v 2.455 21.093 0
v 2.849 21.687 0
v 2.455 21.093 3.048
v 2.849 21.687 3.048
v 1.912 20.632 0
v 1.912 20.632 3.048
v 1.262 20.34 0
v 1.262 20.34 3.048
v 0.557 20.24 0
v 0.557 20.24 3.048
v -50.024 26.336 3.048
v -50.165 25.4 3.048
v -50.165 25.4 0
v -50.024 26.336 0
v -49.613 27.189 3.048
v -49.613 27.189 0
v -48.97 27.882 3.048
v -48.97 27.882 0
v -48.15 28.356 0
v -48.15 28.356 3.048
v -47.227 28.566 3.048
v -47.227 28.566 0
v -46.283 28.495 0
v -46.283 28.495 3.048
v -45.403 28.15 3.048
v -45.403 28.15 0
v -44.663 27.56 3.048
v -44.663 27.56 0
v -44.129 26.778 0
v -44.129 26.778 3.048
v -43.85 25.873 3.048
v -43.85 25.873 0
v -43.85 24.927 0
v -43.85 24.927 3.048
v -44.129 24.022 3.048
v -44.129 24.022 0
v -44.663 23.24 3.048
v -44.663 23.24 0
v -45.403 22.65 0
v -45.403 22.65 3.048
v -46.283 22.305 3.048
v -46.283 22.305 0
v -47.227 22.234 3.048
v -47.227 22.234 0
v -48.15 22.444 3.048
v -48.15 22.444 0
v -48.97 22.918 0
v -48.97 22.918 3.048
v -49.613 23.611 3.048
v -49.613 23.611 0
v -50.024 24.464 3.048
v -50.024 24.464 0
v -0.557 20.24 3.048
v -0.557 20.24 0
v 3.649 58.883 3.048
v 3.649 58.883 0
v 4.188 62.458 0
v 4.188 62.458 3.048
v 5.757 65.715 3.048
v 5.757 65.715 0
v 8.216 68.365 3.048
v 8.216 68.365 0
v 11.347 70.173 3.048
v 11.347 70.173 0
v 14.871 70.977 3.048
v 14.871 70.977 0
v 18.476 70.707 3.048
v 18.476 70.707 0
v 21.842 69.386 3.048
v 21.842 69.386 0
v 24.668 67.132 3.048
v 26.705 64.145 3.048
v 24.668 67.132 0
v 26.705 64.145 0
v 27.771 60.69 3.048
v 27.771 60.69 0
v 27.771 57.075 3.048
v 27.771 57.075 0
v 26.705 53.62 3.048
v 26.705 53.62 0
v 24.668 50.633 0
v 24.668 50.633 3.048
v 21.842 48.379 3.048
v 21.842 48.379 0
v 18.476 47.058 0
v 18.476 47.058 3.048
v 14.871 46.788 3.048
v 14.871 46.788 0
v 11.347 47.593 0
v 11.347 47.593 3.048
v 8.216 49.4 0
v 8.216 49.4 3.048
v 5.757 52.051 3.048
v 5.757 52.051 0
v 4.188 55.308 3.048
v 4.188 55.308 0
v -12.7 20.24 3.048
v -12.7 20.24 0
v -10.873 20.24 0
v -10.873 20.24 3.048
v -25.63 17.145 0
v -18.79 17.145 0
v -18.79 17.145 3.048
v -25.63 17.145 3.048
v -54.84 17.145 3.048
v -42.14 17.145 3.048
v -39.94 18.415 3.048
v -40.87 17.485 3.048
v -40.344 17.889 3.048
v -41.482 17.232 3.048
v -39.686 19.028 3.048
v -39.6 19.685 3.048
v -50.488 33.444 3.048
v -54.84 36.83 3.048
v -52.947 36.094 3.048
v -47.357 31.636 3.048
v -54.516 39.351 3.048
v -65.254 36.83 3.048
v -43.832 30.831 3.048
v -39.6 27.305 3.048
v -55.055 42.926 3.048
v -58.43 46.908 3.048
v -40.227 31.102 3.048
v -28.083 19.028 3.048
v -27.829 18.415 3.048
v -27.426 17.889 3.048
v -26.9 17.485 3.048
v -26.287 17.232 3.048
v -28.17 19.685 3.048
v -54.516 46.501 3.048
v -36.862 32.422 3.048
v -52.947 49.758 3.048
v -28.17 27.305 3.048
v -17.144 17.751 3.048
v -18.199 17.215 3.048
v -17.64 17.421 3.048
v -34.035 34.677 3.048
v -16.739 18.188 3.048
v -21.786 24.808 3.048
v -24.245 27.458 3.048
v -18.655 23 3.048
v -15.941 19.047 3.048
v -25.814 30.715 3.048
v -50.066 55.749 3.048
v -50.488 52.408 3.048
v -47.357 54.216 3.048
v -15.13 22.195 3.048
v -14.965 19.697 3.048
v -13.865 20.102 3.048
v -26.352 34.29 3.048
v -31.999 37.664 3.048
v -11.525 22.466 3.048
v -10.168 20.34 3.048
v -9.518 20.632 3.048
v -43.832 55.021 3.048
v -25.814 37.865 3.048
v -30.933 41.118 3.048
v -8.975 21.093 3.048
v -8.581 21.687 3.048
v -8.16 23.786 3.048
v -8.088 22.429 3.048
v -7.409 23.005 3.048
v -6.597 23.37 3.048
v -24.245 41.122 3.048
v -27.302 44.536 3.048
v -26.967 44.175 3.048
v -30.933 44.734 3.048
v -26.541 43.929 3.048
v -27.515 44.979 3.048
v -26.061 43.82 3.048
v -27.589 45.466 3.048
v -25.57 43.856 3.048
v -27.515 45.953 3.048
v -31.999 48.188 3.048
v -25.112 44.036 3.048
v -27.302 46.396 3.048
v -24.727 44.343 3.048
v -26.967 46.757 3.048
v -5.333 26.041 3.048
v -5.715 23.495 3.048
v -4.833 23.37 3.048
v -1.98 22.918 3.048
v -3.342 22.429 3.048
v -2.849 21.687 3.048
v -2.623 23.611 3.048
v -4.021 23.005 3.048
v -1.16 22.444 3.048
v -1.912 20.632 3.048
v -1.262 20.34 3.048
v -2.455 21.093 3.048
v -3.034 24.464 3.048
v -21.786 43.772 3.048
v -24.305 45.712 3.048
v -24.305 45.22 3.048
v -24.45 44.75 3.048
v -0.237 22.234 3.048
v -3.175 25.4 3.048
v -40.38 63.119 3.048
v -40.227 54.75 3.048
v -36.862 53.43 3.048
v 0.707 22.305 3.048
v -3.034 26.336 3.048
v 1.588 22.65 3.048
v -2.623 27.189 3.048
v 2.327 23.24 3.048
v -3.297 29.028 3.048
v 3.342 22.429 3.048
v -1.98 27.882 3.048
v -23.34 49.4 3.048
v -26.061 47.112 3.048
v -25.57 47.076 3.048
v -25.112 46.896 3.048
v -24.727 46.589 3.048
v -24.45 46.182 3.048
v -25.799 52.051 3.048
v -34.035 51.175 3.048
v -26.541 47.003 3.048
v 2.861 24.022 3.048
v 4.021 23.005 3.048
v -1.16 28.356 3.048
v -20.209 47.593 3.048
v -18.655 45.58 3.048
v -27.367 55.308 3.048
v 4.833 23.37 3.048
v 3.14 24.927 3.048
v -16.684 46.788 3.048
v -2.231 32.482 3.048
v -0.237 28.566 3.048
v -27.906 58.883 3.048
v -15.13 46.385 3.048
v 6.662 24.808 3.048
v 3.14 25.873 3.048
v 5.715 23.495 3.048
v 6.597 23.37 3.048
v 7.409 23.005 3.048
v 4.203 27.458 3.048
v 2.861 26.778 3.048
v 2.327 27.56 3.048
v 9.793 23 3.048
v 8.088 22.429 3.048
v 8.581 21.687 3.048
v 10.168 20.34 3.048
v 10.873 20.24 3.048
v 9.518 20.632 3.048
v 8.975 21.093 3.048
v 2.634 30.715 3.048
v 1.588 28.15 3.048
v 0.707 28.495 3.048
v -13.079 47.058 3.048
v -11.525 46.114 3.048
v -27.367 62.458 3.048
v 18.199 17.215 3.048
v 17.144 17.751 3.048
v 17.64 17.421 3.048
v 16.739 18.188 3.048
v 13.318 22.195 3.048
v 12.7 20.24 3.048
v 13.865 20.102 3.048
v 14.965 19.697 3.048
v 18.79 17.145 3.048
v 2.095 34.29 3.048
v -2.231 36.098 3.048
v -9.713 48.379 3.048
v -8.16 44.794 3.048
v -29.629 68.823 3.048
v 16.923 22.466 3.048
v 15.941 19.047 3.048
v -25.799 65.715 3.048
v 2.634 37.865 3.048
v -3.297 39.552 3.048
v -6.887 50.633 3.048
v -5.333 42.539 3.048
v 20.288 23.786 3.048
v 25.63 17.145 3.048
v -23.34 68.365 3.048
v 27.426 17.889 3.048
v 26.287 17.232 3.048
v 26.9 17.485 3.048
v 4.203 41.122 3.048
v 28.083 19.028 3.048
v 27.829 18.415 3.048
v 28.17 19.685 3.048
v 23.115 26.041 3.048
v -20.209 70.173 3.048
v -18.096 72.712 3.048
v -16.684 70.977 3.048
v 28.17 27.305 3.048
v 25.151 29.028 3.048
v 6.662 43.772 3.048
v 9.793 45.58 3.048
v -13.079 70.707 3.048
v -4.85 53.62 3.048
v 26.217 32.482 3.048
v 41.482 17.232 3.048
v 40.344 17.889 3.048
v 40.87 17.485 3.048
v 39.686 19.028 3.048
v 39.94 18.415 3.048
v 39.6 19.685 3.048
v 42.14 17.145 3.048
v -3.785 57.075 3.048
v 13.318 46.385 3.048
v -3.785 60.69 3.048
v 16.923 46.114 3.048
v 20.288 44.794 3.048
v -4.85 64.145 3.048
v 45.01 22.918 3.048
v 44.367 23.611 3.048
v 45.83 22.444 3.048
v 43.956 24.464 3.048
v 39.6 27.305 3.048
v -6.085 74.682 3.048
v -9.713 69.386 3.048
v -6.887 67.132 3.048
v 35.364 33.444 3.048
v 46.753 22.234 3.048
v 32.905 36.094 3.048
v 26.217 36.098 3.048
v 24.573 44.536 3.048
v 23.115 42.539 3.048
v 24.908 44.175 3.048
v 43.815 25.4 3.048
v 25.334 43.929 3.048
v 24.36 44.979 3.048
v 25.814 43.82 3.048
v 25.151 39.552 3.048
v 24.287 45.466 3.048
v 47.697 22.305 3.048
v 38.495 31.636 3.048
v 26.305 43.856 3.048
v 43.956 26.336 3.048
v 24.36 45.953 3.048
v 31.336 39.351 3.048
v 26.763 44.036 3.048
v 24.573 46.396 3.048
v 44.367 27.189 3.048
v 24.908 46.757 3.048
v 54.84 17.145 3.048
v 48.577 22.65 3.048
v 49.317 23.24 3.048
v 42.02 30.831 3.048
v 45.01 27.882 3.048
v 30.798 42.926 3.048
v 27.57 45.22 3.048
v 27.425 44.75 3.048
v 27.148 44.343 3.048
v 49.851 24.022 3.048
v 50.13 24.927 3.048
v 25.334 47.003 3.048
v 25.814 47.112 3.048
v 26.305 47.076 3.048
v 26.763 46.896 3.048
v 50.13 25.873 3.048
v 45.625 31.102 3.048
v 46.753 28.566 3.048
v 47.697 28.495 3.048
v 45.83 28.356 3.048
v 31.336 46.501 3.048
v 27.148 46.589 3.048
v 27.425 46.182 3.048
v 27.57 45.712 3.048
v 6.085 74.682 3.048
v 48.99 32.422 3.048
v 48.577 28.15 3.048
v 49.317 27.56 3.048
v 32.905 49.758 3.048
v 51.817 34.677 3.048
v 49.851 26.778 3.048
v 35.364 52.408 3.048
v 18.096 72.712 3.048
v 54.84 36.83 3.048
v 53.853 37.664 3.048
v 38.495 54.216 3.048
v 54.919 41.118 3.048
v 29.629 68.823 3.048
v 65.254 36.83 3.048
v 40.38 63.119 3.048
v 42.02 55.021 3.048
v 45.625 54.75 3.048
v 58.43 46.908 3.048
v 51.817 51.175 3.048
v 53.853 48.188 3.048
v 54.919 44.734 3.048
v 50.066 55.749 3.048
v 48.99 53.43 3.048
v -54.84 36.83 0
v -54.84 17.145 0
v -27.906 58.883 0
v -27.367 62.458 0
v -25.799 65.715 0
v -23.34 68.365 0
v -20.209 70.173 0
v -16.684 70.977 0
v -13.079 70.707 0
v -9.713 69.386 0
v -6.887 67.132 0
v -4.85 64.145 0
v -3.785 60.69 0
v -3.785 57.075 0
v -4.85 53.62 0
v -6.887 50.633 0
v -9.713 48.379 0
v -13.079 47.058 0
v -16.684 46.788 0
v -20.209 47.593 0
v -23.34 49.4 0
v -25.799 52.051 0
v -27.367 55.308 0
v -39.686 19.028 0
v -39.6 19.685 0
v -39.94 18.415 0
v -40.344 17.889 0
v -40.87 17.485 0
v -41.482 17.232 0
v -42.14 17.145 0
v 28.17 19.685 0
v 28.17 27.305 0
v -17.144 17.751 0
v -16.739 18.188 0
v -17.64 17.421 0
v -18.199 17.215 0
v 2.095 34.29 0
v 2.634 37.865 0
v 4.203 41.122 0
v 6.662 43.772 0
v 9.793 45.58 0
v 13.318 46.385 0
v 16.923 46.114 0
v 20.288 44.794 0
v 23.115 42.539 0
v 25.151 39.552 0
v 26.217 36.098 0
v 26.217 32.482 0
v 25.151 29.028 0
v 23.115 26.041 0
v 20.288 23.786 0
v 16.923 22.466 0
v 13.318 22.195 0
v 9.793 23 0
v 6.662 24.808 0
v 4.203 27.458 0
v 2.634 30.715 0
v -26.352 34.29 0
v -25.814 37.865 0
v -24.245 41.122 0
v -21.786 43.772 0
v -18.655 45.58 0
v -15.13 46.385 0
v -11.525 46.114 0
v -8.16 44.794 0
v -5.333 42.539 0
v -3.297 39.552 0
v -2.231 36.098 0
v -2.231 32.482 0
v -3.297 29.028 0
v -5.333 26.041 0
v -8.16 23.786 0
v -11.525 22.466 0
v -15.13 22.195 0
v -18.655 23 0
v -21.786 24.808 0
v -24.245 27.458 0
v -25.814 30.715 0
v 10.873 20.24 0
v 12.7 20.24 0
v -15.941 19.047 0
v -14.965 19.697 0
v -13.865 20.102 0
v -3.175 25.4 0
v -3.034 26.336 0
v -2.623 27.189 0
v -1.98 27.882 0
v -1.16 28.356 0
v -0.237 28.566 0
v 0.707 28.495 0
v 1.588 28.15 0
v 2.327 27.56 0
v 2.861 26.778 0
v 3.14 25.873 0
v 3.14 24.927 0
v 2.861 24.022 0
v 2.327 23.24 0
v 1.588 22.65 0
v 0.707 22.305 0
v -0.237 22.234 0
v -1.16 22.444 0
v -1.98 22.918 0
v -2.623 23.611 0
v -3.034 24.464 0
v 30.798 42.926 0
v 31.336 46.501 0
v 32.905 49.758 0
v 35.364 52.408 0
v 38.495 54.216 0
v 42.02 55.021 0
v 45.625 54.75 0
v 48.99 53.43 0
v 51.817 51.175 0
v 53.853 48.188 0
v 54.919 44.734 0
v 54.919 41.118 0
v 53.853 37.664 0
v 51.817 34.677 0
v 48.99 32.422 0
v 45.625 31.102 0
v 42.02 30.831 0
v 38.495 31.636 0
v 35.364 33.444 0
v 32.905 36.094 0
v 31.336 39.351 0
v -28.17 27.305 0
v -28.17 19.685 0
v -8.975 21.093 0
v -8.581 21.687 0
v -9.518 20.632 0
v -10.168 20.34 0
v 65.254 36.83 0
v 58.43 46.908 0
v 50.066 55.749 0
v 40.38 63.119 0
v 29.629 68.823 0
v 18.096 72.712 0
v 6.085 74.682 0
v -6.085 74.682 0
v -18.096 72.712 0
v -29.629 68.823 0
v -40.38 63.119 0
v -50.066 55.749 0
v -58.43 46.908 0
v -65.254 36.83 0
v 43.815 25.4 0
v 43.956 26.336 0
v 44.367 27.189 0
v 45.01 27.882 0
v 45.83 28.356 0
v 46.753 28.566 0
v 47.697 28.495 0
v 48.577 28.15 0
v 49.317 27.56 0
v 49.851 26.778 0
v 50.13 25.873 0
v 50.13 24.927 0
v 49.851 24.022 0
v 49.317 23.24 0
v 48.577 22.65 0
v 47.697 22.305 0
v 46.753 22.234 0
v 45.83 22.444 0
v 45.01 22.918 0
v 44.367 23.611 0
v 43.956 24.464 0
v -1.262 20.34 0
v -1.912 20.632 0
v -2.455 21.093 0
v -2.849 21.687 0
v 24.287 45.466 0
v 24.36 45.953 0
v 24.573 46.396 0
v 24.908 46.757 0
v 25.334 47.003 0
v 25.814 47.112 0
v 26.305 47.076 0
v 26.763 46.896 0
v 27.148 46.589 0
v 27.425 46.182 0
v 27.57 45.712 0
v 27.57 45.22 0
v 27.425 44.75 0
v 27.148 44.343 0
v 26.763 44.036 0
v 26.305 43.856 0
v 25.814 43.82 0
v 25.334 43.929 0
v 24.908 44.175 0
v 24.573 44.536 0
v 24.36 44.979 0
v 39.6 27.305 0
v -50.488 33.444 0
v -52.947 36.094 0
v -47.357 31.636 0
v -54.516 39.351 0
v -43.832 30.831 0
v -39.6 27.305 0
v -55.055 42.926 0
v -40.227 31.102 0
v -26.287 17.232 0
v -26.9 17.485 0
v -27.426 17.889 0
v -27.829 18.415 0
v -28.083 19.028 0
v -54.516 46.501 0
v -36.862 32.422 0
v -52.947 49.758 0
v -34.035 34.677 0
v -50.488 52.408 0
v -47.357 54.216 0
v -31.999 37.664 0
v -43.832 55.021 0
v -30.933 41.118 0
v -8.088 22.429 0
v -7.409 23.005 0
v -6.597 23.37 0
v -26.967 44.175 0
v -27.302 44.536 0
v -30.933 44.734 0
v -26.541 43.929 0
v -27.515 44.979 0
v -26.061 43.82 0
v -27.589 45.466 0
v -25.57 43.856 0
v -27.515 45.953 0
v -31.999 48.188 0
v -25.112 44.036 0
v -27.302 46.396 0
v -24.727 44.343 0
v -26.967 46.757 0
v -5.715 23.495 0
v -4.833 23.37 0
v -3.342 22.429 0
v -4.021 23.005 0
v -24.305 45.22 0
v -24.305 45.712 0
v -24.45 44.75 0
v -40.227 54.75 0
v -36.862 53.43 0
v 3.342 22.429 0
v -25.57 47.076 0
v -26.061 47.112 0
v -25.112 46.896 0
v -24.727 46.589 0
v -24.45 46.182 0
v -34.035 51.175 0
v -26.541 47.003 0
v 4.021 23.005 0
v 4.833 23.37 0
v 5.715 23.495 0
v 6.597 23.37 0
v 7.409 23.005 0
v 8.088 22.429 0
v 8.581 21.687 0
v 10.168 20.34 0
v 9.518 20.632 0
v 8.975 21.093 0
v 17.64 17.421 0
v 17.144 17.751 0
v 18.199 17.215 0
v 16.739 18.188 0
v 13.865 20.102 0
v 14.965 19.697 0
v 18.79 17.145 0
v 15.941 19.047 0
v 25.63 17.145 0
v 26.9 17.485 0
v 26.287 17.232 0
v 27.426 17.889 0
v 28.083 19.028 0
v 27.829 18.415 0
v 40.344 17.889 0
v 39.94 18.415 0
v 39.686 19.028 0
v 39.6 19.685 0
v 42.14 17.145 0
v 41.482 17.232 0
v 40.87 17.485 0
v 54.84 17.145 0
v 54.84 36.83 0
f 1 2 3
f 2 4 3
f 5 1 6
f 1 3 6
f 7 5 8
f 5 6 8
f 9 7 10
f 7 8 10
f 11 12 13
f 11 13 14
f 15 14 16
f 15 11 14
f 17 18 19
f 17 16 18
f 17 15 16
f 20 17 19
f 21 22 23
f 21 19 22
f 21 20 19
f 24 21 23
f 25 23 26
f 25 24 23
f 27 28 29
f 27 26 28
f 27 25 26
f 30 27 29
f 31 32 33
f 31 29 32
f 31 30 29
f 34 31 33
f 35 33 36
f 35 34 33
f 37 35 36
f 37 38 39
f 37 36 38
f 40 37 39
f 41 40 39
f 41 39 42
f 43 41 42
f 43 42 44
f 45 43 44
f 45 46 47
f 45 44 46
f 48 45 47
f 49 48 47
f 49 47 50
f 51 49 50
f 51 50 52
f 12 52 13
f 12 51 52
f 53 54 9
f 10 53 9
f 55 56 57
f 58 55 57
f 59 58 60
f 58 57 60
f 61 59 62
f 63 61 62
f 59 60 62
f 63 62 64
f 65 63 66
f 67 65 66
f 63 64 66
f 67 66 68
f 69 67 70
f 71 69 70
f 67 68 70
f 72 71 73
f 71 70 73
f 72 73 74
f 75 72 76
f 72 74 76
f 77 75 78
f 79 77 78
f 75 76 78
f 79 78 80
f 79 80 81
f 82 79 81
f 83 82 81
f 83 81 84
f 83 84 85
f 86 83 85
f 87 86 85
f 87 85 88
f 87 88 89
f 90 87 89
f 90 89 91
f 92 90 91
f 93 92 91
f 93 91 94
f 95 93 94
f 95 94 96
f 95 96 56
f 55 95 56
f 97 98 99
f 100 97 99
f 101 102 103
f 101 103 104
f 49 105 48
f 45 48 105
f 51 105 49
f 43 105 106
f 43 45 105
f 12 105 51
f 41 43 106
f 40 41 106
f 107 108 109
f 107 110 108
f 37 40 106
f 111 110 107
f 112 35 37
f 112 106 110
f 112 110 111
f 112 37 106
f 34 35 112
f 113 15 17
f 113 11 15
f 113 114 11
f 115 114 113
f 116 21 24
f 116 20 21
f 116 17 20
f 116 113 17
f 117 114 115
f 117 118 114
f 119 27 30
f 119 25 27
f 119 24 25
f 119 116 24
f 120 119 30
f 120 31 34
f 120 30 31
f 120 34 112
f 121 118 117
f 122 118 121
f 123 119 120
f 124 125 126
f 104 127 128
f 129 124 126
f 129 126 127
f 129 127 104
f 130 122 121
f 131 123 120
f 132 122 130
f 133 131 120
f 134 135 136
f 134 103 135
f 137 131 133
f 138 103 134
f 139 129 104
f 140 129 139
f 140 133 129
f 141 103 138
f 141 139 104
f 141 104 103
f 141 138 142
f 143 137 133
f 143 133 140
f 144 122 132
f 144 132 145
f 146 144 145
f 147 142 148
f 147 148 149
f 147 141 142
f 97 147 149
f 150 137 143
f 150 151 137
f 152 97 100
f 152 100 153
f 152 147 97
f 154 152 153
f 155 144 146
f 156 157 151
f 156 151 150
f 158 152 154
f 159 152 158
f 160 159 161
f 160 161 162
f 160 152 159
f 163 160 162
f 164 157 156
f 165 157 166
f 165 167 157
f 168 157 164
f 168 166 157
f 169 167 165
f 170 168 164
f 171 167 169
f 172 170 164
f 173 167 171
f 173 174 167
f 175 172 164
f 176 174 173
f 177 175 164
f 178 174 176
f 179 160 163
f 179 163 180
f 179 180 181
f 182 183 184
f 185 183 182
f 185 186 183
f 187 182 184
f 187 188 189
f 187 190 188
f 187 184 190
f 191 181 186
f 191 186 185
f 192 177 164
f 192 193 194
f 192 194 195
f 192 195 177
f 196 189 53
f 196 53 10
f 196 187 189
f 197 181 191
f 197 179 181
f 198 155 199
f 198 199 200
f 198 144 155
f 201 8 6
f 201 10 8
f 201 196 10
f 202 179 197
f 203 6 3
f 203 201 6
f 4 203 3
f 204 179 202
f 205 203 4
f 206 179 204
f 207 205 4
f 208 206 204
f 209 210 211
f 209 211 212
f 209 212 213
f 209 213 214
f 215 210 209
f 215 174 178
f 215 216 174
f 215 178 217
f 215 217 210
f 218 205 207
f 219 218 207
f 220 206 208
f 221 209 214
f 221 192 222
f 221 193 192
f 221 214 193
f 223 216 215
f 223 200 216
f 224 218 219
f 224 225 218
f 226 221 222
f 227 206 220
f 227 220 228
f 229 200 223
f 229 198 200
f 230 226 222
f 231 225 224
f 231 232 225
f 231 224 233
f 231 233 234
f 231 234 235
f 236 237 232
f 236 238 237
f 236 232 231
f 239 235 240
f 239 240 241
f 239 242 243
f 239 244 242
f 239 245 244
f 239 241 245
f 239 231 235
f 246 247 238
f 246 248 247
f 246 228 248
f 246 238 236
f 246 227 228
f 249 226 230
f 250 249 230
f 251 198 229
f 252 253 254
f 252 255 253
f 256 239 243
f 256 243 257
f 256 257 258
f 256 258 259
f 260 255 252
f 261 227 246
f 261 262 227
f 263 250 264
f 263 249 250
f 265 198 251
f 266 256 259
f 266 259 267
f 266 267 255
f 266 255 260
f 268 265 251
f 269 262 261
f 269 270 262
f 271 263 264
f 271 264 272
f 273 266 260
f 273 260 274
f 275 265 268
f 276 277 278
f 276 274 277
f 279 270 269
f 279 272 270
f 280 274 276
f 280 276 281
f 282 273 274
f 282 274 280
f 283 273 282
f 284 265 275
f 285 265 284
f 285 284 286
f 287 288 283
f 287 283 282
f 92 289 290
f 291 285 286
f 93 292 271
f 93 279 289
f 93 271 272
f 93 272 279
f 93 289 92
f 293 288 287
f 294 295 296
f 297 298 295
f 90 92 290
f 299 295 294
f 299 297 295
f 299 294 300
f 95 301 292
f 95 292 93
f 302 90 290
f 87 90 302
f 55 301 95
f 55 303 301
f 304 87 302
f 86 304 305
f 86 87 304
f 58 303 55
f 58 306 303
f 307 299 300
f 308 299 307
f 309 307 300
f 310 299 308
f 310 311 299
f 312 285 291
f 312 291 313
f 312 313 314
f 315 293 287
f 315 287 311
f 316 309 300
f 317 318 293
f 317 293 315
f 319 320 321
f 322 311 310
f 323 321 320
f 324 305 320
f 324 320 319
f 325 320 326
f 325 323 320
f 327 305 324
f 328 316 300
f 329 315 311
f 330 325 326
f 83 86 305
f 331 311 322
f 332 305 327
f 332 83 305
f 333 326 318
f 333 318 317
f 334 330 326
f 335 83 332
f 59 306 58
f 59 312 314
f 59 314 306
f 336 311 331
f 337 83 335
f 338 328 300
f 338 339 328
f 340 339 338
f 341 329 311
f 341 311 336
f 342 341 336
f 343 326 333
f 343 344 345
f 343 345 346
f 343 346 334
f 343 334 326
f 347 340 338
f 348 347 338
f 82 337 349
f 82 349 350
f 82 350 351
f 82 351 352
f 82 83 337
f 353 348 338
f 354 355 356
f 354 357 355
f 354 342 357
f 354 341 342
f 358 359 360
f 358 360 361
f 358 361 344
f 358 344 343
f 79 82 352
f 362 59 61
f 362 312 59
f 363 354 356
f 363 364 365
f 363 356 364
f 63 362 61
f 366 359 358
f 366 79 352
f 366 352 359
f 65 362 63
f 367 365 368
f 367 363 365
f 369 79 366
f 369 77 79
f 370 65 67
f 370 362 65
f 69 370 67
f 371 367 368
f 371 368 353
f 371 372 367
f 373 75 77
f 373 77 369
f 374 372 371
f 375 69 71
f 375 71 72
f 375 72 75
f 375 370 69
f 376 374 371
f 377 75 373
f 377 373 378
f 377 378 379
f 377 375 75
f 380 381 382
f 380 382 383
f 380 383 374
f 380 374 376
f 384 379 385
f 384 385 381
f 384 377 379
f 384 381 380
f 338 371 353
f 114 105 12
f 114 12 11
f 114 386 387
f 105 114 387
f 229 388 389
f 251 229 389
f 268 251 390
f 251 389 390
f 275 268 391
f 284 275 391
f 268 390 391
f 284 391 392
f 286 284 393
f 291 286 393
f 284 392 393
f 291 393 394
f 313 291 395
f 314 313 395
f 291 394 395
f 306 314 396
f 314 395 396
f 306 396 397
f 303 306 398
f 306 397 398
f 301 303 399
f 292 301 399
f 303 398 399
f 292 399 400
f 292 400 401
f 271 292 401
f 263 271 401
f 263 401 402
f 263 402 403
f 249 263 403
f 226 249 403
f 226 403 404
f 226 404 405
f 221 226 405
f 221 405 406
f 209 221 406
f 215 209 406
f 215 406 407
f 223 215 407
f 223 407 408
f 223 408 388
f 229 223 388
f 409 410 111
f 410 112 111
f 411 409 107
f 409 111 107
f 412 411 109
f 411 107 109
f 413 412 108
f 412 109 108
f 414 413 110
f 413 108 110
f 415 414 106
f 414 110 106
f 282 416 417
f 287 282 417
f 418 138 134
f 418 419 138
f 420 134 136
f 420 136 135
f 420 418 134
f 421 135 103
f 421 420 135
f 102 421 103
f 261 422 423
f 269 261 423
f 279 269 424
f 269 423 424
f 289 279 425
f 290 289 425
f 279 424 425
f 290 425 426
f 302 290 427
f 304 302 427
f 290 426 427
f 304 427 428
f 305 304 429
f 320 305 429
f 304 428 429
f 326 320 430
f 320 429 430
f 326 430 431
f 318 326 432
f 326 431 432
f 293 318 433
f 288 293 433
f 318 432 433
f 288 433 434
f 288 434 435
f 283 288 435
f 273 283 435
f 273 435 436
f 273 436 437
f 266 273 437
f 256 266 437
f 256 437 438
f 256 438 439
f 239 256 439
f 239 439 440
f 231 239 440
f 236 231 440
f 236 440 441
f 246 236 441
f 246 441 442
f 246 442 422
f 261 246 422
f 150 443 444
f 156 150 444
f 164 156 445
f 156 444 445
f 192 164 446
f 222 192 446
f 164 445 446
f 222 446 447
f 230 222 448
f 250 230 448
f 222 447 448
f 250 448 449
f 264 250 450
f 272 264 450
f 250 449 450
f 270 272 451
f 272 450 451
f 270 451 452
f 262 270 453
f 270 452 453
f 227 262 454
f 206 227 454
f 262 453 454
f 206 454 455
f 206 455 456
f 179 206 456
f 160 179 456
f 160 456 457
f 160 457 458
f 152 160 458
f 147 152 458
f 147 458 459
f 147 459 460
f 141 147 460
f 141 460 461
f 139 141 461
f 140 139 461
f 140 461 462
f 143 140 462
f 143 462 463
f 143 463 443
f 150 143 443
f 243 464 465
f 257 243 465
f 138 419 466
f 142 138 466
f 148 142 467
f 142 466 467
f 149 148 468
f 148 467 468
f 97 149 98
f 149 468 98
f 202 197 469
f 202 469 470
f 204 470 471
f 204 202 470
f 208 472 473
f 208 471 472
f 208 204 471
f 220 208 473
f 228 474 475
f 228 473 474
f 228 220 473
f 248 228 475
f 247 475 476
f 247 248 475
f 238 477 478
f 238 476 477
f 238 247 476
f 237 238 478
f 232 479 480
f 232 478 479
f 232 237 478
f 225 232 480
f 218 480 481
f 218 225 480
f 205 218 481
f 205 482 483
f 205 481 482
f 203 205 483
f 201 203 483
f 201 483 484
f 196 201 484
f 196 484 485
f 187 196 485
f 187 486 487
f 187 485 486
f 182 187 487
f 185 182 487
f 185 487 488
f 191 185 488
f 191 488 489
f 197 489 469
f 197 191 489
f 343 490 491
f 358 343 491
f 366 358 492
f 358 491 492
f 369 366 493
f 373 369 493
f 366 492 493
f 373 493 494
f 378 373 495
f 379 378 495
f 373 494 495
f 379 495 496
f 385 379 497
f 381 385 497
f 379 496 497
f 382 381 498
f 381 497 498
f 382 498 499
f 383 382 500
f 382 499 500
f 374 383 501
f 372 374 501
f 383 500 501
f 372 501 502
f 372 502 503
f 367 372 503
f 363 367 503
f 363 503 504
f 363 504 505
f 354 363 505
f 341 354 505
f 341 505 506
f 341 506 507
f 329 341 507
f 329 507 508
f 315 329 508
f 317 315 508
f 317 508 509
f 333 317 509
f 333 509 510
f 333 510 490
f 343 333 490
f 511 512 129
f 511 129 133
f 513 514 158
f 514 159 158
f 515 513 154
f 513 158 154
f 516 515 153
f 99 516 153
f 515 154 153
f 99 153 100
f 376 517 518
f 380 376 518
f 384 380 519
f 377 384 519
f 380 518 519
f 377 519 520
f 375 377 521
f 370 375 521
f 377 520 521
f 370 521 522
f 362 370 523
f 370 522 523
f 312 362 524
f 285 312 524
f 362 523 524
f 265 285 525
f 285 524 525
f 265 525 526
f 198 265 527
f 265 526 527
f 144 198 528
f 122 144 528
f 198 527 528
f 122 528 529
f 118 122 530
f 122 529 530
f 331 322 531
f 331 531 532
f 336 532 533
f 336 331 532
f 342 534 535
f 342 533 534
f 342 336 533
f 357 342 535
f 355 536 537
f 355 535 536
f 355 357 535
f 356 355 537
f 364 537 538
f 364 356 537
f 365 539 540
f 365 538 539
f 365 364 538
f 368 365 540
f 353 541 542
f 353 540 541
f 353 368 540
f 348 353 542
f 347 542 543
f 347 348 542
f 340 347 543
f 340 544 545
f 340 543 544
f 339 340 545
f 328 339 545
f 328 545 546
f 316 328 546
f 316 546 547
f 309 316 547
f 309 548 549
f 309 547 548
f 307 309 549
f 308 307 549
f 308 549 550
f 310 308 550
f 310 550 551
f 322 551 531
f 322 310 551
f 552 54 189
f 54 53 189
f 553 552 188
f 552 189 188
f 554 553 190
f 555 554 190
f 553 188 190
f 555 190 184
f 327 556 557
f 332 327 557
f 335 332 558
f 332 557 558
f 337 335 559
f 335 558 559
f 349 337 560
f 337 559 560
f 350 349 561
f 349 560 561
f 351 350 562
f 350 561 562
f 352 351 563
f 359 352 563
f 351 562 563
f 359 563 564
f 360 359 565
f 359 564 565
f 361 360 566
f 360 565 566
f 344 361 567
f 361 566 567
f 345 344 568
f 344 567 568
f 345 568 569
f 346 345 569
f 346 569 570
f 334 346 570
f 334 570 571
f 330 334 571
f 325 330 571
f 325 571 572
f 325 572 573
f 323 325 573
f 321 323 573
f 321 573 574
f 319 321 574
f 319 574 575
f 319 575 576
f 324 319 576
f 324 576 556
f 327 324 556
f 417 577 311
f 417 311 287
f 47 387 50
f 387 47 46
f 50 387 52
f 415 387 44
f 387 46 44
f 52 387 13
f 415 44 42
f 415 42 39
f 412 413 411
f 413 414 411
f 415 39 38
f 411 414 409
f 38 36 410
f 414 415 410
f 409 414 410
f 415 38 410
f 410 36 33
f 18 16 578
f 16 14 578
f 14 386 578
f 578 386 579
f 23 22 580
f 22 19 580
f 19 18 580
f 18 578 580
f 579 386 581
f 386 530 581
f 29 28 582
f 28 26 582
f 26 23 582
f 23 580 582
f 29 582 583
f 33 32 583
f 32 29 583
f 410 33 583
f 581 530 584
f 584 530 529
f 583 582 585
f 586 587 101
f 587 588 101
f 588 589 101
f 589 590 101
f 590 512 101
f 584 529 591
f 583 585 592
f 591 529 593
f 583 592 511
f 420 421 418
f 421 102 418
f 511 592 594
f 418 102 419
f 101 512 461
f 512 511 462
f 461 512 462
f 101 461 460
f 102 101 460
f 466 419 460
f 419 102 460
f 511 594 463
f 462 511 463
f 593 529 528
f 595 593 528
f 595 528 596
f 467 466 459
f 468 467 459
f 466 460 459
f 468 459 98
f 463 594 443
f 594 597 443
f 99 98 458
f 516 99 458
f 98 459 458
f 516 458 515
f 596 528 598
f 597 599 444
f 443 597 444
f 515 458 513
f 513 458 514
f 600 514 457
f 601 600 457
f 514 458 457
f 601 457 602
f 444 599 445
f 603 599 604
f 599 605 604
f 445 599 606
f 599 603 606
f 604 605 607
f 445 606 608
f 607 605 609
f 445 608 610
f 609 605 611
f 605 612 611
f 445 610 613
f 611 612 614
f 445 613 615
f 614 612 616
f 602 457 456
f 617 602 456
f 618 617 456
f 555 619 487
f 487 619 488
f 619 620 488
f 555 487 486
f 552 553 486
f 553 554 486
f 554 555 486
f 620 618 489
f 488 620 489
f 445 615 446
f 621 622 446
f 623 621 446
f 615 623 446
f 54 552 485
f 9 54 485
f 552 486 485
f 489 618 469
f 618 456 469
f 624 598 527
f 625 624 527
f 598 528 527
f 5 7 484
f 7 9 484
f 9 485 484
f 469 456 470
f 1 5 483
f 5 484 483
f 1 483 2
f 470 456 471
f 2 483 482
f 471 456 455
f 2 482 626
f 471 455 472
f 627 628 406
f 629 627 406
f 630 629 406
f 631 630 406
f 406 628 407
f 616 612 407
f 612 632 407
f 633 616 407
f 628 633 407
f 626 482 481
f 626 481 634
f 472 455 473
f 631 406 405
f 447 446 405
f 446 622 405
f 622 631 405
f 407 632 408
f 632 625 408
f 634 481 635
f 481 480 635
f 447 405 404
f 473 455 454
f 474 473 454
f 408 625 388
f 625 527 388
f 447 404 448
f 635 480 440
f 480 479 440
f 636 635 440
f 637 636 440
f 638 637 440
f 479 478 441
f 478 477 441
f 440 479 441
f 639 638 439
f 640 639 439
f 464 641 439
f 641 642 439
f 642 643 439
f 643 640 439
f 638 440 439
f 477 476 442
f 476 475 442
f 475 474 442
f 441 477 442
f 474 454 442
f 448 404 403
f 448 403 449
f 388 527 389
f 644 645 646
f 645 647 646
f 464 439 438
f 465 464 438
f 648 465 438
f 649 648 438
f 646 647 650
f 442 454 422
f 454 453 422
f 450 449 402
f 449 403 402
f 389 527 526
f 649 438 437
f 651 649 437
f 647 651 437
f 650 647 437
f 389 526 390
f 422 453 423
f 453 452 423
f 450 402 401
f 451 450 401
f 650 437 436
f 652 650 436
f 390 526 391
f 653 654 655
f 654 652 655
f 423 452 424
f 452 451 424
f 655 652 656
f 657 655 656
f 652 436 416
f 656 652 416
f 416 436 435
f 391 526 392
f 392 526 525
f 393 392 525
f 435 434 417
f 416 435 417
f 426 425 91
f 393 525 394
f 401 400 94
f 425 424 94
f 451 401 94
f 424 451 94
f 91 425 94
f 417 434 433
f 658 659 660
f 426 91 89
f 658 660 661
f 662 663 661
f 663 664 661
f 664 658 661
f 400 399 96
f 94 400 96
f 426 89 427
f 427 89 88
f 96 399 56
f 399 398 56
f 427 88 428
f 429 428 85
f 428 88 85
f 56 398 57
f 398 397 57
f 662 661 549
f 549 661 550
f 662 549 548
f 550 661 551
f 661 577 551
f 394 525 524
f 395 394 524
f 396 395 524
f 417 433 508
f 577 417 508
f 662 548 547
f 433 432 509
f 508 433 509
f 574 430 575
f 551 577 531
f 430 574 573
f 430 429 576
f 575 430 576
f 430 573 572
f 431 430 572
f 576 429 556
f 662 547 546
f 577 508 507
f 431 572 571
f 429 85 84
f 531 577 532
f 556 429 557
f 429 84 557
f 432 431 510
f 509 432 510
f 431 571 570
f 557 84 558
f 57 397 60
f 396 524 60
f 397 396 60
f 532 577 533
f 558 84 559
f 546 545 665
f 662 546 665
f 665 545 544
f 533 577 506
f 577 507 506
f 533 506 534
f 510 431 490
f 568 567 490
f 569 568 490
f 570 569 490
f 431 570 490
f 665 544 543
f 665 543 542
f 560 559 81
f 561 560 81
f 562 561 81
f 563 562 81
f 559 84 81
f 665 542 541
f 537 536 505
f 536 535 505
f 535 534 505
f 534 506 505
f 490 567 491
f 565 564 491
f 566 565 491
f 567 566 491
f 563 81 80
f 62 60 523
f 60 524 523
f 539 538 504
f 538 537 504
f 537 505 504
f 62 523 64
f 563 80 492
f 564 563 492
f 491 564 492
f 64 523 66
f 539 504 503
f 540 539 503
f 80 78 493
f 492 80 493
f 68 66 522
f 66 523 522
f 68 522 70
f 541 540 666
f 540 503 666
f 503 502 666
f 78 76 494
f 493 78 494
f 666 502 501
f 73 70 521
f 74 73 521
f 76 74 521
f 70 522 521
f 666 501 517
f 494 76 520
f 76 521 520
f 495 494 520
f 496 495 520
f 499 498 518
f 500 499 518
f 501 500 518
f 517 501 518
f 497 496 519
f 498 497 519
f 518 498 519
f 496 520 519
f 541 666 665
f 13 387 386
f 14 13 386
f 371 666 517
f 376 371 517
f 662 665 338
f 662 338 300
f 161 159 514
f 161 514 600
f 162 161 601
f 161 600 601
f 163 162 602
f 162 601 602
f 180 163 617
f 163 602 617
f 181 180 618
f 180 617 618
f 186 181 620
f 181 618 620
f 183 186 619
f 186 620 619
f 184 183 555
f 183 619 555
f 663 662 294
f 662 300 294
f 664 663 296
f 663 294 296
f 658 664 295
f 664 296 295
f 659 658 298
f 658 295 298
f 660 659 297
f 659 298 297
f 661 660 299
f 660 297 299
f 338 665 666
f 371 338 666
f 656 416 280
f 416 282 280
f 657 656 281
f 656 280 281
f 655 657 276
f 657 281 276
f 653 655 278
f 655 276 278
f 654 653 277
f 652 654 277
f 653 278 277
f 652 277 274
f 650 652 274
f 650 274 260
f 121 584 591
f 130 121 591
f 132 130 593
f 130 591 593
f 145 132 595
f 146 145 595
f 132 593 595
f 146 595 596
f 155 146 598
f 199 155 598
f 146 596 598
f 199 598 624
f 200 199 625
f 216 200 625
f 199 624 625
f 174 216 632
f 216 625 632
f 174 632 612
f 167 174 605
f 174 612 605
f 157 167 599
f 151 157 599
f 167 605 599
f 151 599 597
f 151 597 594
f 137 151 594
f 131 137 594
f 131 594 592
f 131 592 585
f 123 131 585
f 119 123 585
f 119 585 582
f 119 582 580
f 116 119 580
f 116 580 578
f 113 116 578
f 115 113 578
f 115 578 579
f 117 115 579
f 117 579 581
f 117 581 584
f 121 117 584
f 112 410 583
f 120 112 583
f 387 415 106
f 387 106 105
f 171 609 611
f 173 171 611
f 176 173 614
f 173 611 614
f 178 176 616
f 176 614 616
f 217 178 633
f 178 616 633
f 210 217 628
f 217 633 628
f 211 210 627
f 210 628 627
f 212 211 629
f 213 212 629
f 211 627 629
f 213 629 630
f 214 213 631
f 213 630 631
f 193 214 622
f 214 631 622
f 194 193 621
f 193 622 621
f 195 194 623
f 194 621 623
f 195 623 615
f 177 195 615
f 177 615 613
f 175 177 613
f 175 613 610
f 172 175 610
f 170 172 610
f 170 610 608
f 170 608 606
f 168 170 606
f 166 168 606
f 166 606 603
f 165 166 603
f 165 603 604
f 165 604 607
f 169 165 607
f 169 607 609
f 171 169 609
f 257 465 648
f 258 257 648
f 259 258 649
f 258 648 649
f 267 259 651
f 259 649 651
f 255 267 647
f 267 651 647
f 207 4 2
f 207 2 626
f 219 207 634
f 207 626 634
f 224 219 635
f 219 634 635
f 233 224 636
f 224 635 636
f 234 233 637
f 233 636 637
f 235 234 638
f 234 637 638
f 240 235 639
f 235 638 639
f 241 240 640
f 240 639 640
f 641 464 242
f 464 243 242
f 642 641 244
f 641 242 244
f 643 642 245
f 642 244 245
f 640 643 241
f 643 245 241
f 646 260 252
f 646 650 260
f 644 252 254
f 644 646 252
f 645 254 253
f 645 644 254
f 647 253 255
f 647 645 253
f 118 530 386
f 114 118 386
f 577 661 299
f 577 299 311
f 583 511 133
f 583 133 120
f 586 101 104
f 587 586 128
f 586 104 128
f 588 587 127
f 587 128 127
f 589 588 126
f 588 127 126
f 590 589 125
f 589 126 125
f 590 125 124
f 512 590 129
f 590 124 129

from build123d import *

# Parameters (mm, degrees)
SKETCH1_R                 = 1.651
BOSS_EXTRUDE2_DEPTH       = 3.048
SKETCH2_R                 = 1.143
CUT_EXTRUDE1_DEPTH        = 4.048
SKETCH3_R                 = 12.1285
CUT_EXTRUDE2_DEPTH        = 4.048
SKETCH4_W                 = 28.562713242
SKETCH4_H                 = 11.677503754
BOSS_EXTRUDE3_DEPTH       = 3.048
SKETCH5_W                 = 230.699333954
SKETCH5_H                 = 107.587024537
CUT_EXTRUDE3_DEPTH        = 4.048
SKETCH6_R                 = 12.1285
CUT_EXTRUDE4_DEPTH        = 4.048
SKETCH9_W                 = 11.43
SKETCH9_H                 = 10.16
CUT_EXTRUDE7_DEPTH        = 4.048
SKETCH65_R                = 1.651
CUT_EXTRUDE63_DEPTH       = 97.79
SKETCH119_R               = 3.175
CUT_EXTRUDE117_DEPTH      = 103.378
CUT_EXTRUDE117_DEPTH_BACK = 48.768
CUT_EXTRUDE10_DEPTH       = 14.224
FILLET1_R                 = 2.54


with BuildPart() as part:
    # Sketch1 → Boss-Extrude2 (new body)
    with BuildSketch(Plane.XY):
        with BuildLine():
            Line((-65.2537815, 36.83), (-54.8397815, 36.83))
            Line((-54.8397815, 36.83), (-54.8397815, -36.83))
            Line((-54.8397815, -36.83), (-65.2537815, -36.83))
            ThreePointArc((-65.2537815, -36.83), (0, -74.93), (65.2537815, -36.83))
            Line((65.2537815, -36.83), (54.8397815, -36.83))
            Line((54.8397815, -36.83), (54.8397815, 36.83))
            Line((54.8397815, 36.83), (65.2537815, 36.83))
            ThreePointArc((65.2537815, 36.83), (0, 74.93), (-65.2537815, 36.83))
        make_face()
        with Locations((-45.466, 11.049)):
            Circle(SKETCH1_R, mode=Mode.SUBTRACT)
        with Locations((-20.067270032, 10.795)):
            Circle(SKETCH1_R, mode=Mode.SUBTRACT)
        with Locations((-20.067270032, -10.795)):
            Circle(SKETCH1_R, mode=Mode.SUBTRACT)
        with Locations((-45.466, -11.049)):
            Circle(SKETCH1_R, mode=Mode.SUBTRACT)
        with Locations((45.466, -11.049)):
            Circle(SKETCH1_R, mode=Mode.SUBTRACT)
        with Locations((20.067270032, -10.795)):
            Circle(SKETCH1_R, mode=Mode.SUBTRACT)
        with Locations((20.067270032, 10.795)):
            Circle(SKETCH1_R, mode=Mode.SUBTRACT)
        with Locations((45.466, 11.049)):
            Circle(SKETCH1_R, mode=Mode.SUBTRACT)
    extrude(amount=BOSS_EXTRUDE2_DEPTH)

    # Sketch2 → Cut-Extrude1 (cut, through all)
    with BuildSketch(Plane.XY.offset(3.048)):
        with Locations((-6.731, 62.23)):
            Circle(SKETCH2_R)
        with Locations((6.731, 62.23)):
            Circle(SKETCH2_R)
    extrude(amount=-CUT_EXTRUDE1_DEPTH, mode=Mode.SUBTRACT)

    # Sketch3 → Cut-Extrude2 (cut, through all)
    with BuildSketch(Plane(origin=(0, 0, 0), x_dir=(-1, 0, 0), z_dir=(0, 0, -1))):
        with Locations((-42.926, -42.926)):
            Circle(SKETCH3_R)
        with Locations((-14.224, 34.29)):
            Circle(SKETCH3_R)
        with Locations((14.224, -34.29)):
            Circle(SKETCH3_R)
        with Locations((14.224, 34.29)):
            Circle(SKETCH3_R)
        with Locations((-42.926, 42.926)):
            Circle(SKETCH3_R)
        with Locations((42.926, 42.926)):
            Circle(SKETCH3_R)
        with Locations((-14.224, -34.29)):
            Circle(SKETCH3_R)
        with Locations((42.926, -42.926)):
            Circle(SKETCH3_R)
    extrude(amount=-CUT_EXTRUDE2_DEPTH, mode=Mode.SUBTRACT)

    # Sketch4 → Boss-Extrude3 (add)
    with BuildSketch(Plane(origin=(0, 0, 0), x_dir=(-1, 0, 0), z_dir=(0, 0, -1))):
        with Locations((-1.488809975, 62.152540216)):
            Rectangle(SKETCH4_W, SKETCH4_H)
    extrude(amount=-BOSS_EXTRUDE3_DEPTH)

    # Sketch5 → Cut-Extrude3 (cut, through all)
    with BuildSketch(Plane(origin=(0, 0, 0), x_dir=(-1, 0, 0), z_dir=(0, 0, -1))):
        with Locations((1.971047261, -36.648512269)):
            Rectangle(SKETCH5_W, SKETCH5_H)
    extrude(amount=-CUT_EXTRUDE3_DEPTH, mode=Mode.SUBTRACT)

    # Sketch6 → Cut-Extrude4 (cut, through all)
    with BuildSketch(Plane(origin=(0, 0, 0), x_dir=(-1, 0, 0), z_dir=(0, 0, -1))):
        with Locations((-15.777608989, 58.882838371)):
            Circle(SKETCH6_R)
        with Locations((15.777608989, 58.882838371)):
            Circle(SKETCH6_R)
    extrude(amount=-CUT_EXTRUDE4_DEPTH, mode=Mode.SUBTRACT)

    # Sketch9 → Cut-Extrude7 (cut, through all)
    with BuildSketch(Plane(origin=(0, 0, 0), x_dir=(-1, 0, 0), z_dir=(0, 0, -1))):
        with Locations((33.8847815, 22.225)):
            Rectangle(SKETCH9_W, SKETCH9_H)
        with Locations((-33.8847815, 22.225)):
            Rectangle(SKETCH9_W, SKETCH9_H)
    extrude(amount=-CUT_EXTRUDE7_DEPTH, mode=Mode.SUBTRACT)

    # Sketch65 → Cut-Extrude63 (cut)
    with BuildSketch(Plane(origin=(30.092005081, 4.08352975, -16.1925), x_dir=(-1, 0, 0), z_dir=(0, 0, -1))):
        with Locations((4.154396091, 41.38247025)):
            Circle(SKETCH65_R)
        with Locations((56.02961407, 41.38247025)):
            Circle(SKETCH65_R)
    extrude(amount=-CUT_EXTRUDE63_DEPTH, mode=Mode.SUBTRACT)

    # Sketch119 → Cut-Extrude117 (cut, two sides)
    with BuildSketch(Plane(origin=(30.092005081, 4.08352975, 19.939), x_dir=(-1, 0, 0), z_dir=(0, 0, -1))) as cut_extrude117_sk:
        with Locations((-16.897994919, 21.31647025)):
            Circle(SKETCH119_R)
        with Locations((77.082005081, 21.31647025)):
            Circle(SKETCH119_R)
        with Locations((30.092005081, 21.31647025)):
            Circle(SKETCH119_R)
    extrude(amount=CUT_EXTRUDE117_DEPTH, mode=Mode.SUBTRACT)
    extrude(cut_extrude117_sk.sketch, amount=-CUT_EXTRUDE117_DEPTH_BACK, mode=Mode.SUBTRACT)

    # Sketch12 → Cut-Extrude10 (cut)
    with BuildSketch(Plane(origin=(0, 0, 0), x_dir=(-1, 0, 0), z_dir=(0, 0, -1))):
        with BuildLine():
            Line((12.7, 20.24), (8.888991966, 20.24))
            ThreePointArc((8.888991966, 20.24), (5.715, 23.495), (2.541008034, 20.24))
            Line((2.541008034, 20.24), (-2.541008034, 20.24))
            ThreePointArc((-2.541008034, 20.24), (-5.715, 23.495), (-8.888991966, 20.24))
            Line((-8.888991966, 20.24), (-12.7, 20.24))
            ThreePointArc((-12.7, 20.24), (-16.235533906, 11.704466094), (-7.7, 15.24))
            Line((-7.7, 15.24), (7.7, 15.24))
            ThreePointArc((7.7, 15.24), (16.235533906, 11.704466094), (12.7, 20.24))
        make_face()
    extrude(amount=-CUT_EXTRUDE10_DEPTH, mode=Mode.SUBTRACT)

    # Fillet1
    fillet1_edges = [part.edges().sort_by_distance(p)[0] for p in [
        (-39.5997815, 17.145, 1.524),
        (-28.1697815, 17.145, 1.524),
        (28.1697815, 17.145, 1.524),
        (39.5997815, 17.145, 1.524),
        (-17.322875188, 17.145, 1.524),
        (17.322875188, 17.145, 1.524),
        (8.888991966, 20.24, 1.524),
        (2.541008034, 20.24, 1.524),
        (-2.541008034, 20.24, 1.524),
        (-8.888991966, 20.24, 1.524),
    ]]
    fillet(fillet1_edges, radius=FILLET1_R)


solid = part.part
